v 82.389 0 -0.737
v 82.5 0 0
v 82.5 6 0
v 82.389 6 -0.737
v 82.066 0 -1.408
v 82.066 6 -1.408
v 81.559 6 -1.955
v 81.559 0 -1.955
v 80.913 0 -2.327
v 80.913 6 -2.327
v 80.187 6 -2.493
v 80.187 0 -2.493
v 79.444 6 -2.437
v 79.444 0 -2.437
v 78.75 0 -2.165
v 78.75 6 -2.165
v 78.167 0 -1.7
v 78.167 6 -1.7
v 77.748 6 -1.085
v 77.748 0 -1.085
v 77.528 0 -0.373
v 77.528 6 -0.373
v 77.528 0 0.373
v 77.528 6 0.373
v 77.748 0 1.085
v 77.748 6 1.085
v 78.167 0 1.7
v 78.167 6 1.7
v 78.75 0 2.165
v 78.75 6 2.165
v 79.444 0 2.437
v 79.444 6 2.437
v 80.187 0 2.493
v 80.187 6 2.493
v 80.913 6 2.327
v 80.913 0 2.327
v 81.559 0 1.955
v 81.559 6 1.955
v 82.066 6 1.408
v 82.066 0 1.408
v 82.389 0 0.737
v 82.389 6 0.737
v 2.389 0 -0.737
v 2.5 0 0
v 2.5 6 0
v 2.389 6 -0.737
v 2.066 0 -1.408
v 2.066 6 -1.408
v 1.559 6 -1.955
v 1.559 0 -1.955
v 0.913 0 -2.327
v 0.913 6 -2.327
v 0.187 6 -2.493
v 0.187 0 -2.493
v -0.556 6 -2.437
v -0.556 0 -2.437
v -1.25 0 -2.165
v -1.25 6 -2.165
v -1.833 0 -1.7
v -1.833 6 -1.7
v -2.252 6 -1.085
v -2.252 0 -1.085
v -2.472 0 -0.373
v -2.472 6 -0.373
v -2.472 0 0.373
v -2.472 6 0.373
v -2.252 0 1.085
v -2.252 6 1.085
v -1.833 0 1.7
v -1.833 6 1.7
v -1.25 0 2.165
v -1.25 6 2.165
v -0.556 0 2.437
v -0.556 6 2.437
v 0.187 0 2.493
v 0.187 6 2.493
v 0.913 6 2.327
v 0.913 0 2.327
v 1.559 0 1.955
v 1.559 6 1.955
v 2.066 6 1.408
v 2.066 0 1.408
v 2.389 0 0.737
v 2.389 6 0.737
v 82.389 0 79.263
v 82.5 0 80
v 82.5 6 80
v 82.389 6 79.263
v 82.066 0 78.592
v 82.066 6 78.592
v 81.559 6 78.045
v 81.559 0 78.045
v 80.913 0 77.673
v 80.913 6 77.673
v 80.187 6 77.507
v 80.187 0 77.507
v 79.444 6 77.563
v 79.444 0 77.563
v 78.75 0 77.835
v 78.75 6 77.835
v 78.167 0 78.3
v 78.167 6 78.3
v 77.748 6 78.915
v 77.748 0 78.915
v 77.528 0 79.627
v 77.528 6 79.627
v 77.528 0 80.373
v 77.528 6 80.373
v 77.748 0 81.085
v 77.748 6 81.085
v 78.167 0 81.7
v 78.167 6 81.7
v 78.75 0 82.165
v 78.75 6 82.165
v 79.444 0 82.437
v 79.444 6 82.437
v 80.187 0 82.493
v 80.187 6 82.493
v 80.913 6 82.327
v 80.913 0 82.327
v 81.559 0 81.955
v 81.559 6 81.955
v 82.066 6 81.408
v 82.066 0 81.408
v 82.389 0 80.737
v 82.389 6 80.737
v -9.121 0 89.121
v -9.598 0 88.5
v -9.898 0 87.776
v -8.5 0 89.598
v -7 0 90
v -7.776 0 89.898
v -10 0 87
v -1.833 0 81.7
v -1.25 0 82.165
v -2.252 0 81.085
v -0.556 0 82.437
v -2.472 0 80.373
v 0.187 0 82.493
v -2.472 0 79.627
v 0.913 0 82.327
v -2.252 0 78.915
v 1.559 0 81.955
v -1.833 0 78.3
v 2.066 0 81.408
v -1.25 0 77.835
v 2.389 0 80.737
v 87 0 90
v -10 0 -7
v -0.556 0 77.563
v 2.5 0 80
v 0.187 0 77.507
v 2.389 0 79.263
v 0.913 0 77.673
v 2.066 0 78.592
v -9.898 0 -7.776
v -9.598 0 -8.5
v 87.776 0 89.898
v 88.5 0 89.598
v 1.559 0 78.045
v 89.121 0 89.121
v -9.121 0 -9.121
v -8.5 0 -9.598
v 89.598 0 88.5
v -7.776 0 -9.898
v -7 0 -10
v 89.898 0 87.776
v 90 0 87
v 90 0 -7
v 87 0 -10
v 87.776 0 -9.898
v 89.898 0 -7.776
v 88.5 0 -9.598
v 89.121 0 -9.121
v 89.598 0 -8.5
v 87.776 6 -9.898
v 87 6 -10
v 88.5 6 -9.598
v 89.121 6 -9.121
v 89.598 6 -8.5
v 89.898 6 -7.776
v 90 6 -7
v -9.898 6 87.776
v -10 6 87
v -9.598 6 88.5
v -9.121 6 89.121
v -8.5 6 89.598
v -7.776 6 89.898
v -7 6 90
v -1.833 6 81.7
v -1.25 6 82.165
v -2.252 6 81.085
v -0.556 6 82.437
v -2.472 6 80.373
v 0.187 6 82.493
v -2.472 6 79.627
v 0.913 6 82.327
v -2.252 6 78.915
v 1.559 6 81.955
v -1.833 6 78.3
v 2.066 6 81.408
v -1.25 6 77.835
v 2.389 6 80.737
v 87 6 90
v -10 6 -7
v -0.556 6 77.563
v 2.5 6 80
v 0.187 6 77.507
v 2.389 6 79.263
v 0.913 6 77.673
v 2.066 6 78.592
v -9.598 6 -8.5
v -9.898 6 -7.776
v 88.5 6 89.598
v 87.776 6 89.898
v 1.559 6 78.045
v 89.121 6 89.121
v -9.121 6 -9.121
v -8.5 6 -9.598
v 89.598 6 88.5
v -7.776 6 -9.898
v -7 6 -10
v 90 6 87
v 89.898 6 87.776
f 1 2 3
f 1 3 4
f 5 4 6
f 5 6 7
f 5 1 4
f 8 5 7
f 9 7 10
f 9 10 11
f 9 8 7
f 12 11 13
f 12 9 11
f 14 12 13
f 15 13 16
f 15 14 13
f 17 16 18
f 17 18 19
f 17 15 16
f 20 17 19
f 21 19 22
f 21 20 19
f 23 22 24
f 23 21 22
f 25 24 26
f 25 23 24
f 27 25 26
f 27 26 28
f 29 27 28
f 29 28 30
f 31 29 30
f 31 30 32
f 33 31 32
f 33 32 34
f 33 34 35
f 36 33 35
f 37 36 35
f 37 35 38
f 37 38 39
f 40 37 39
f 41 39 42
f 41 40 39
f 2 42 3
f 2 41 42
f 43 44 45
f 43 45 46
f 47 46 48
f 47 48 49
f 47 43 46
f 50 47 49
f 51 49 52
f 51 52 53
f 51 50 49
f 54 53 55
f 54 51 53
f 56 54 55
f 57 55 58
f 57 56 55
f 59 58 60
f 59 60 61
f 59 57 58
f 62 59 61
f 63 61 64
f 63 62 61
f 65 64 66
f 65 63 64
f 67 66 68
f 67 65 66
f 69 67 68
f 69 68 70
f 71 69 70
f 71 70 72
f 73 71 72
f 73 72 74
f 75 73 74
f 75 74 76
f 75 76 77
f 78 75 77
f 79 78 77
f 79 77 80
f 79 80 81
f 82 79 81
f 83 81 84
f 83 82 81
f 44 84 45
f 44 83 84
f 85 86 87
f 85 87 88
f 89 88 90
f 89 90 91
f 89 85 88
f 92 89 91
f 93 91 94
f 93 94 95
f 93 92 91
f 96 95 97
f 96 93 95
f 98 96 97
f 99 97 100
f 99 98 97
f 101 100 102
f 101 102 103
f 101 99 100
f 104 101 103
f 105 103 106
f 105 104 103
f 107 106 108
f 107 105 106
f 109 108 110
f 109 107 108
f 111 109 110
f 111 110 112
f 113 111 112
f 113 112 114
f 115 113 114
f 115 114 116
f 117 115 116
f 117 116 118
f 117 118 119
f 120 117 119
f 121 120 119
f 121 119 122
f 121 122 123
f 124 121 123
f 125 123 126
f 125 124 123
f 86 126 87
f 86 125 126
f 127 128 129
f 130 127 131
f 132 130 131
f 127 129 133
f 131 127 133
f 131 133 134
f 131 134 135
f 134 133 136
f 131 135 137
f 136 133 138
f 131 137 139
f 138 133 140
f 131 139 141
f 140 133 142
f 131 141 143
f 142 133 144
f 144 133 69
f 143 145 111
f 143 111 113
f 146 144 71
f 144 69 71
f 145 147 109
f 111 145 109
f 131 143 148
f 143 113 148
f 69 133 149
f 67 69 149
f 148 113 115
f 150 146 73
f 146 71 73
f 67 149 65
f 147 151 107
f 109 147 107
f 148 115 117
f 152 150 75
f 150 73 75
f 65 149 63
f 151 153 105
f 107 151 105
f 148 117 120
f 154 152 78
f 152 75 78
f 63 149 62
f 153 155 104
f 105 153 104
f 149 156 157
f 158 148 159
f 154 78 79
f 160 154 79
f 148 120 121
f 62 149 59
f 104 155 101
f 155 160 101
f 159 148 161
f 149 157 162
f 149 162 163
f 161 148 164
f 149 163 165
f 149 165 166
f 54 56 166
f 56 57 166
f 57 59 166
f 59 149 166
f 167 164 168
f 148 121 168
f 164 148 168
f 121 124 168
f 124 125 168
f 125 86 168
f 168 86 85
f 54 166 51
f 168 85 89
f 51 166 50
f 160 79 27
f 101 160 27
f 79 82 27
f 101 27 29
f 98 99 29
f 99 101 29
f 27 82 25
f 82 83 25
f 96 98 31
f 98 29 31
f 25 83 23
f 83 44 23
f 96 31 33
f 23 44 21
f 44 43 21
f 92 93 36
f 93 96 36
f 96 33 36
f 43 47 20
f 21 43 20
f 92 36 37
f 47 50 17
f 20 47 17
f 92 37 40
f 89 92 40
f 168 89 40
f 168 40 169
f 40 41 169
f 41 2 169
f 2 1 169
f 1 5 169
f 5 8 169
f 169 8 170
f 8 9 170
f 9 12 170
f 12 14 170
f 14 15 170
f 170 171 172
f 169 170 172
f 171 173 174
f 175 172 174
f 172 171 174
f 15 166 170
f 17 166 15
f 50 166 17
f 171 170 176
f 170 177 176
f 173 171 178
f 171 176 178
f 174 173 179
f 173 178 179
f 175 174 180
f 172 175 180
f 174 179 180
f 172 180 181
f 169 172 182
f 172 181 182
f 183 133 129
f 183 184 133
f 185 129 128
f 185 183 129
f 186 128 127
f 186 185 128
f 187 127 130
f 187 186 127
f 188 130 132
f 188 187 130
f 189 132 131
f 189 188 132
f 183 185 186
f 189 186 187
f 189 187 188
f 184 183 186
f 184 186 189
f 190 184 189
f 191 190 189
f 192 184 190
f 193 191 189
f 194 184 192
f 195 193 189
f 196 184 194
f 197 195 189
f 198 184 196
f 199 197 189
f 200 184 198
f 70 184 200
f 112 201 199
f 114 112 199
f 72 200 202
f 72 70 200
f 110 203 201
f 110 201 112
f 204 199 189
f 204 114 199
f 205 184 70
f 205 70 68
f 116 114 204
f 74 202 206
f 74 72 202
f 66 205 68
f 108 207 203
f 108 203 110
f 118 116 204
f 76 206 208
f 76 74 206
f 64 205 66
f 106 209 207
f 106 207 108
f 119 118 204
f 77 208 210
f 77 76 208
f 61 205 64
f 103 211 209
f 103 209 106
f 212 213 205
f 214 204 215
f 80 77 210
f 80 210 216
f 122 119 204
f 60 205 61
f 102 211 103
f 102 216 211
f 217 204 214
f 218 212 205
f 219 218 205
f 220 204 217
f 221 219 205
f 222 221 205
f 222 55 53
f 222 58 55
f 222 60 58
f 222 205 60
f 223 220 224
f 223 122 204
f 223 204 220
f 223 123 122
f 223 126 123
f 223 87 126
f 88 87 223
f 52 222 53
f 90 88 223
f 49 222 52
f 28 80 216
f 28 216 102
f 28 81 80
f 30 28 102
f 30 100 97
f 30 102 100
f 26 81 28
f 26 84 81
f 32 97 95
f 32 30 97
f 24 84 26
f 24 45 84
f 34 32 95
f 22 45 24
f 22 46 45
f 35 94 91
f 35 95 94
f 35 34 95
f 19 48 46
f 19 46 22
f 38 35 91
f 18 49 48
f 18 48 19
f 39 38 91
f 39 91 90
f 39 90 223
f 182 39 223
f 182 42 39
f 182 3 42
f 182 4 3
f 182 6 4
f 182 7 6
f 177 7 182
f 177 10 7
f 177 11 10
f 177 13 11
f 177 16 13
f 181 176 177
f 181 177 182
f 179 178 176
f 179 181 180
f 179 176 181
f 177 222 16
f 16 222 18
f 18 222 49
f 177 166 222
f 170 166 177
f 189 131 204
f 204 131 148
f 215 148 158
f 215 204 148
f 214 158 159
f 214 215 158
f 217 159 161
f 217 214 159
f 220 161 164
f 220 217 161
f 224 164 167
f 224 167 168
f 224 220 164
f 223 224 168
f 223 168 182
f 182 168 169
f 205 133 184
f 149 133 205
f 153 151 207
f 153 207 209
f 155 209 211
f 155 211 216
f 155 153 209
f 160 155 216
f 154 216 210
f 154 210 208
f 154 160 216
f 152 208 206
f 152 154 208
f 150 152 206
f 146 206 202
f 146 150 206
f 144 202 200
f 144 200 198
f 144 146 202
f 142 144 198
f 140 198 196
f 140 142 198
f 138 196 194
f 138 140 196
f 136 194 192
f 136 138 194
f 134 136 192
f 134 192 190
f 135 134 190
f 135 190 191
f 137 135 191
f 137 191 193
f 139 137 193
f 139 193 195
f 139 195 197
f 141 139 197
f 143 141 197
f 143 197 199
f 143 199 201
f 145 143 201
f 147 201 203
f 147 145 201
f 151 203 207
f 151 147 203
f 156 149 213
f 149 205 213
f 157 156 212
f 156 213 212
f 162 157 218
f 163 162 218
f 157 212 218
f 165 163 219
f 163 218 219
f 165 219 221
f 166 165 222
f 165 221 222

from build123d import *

# Parameters (mm, degrees)
SKETCH1_W           = 100
SKETCH1_H           = 100
SKETCH1_R           = 2.5
BOSS_EXTRUDE1_DEPTH = 6
FILLET1_R           = 3


with BuildPart() as part:
    # Sketch1 → Boss-Extrude1 (new body)
    with BuildSketch(Plane(origin=(0, 0, 0), x_dir=(1, 0, 0), z_dir=(0, 1, 0))):
        with Locations((40, -40)):
            Rectangle(SKETCH1_W, SKETCH1_H)
        Circle(SKETCH1_R, mode=Mode.SUBTRACT)
        with Locations((80, 0)):
            Circle(SKETCH1_R, mode=Mode.SUBTRACT)
        with Locations((80, -80)):
            Circle(SKETCH1_R, mode=Mode.SUBTRACT)
        with Locations((0, -80)):
            Circle(SKETCH1_R, mode=Mode.SUBTRACT)
    extrude(amount=BOSS_EXTRUDE1_DEPTH)

    # Fillet1
    fillet1_edges = [part.edges().sort_by_distance(p)[0] for p in [
        (-10, 3, -10),
        (90, 3, -10),
        (90, 3, 90),
        (-10, 3, 90),
    ]]
    fillet(fillet1_edges, radius=FILLET1_R)


solid = part.part
